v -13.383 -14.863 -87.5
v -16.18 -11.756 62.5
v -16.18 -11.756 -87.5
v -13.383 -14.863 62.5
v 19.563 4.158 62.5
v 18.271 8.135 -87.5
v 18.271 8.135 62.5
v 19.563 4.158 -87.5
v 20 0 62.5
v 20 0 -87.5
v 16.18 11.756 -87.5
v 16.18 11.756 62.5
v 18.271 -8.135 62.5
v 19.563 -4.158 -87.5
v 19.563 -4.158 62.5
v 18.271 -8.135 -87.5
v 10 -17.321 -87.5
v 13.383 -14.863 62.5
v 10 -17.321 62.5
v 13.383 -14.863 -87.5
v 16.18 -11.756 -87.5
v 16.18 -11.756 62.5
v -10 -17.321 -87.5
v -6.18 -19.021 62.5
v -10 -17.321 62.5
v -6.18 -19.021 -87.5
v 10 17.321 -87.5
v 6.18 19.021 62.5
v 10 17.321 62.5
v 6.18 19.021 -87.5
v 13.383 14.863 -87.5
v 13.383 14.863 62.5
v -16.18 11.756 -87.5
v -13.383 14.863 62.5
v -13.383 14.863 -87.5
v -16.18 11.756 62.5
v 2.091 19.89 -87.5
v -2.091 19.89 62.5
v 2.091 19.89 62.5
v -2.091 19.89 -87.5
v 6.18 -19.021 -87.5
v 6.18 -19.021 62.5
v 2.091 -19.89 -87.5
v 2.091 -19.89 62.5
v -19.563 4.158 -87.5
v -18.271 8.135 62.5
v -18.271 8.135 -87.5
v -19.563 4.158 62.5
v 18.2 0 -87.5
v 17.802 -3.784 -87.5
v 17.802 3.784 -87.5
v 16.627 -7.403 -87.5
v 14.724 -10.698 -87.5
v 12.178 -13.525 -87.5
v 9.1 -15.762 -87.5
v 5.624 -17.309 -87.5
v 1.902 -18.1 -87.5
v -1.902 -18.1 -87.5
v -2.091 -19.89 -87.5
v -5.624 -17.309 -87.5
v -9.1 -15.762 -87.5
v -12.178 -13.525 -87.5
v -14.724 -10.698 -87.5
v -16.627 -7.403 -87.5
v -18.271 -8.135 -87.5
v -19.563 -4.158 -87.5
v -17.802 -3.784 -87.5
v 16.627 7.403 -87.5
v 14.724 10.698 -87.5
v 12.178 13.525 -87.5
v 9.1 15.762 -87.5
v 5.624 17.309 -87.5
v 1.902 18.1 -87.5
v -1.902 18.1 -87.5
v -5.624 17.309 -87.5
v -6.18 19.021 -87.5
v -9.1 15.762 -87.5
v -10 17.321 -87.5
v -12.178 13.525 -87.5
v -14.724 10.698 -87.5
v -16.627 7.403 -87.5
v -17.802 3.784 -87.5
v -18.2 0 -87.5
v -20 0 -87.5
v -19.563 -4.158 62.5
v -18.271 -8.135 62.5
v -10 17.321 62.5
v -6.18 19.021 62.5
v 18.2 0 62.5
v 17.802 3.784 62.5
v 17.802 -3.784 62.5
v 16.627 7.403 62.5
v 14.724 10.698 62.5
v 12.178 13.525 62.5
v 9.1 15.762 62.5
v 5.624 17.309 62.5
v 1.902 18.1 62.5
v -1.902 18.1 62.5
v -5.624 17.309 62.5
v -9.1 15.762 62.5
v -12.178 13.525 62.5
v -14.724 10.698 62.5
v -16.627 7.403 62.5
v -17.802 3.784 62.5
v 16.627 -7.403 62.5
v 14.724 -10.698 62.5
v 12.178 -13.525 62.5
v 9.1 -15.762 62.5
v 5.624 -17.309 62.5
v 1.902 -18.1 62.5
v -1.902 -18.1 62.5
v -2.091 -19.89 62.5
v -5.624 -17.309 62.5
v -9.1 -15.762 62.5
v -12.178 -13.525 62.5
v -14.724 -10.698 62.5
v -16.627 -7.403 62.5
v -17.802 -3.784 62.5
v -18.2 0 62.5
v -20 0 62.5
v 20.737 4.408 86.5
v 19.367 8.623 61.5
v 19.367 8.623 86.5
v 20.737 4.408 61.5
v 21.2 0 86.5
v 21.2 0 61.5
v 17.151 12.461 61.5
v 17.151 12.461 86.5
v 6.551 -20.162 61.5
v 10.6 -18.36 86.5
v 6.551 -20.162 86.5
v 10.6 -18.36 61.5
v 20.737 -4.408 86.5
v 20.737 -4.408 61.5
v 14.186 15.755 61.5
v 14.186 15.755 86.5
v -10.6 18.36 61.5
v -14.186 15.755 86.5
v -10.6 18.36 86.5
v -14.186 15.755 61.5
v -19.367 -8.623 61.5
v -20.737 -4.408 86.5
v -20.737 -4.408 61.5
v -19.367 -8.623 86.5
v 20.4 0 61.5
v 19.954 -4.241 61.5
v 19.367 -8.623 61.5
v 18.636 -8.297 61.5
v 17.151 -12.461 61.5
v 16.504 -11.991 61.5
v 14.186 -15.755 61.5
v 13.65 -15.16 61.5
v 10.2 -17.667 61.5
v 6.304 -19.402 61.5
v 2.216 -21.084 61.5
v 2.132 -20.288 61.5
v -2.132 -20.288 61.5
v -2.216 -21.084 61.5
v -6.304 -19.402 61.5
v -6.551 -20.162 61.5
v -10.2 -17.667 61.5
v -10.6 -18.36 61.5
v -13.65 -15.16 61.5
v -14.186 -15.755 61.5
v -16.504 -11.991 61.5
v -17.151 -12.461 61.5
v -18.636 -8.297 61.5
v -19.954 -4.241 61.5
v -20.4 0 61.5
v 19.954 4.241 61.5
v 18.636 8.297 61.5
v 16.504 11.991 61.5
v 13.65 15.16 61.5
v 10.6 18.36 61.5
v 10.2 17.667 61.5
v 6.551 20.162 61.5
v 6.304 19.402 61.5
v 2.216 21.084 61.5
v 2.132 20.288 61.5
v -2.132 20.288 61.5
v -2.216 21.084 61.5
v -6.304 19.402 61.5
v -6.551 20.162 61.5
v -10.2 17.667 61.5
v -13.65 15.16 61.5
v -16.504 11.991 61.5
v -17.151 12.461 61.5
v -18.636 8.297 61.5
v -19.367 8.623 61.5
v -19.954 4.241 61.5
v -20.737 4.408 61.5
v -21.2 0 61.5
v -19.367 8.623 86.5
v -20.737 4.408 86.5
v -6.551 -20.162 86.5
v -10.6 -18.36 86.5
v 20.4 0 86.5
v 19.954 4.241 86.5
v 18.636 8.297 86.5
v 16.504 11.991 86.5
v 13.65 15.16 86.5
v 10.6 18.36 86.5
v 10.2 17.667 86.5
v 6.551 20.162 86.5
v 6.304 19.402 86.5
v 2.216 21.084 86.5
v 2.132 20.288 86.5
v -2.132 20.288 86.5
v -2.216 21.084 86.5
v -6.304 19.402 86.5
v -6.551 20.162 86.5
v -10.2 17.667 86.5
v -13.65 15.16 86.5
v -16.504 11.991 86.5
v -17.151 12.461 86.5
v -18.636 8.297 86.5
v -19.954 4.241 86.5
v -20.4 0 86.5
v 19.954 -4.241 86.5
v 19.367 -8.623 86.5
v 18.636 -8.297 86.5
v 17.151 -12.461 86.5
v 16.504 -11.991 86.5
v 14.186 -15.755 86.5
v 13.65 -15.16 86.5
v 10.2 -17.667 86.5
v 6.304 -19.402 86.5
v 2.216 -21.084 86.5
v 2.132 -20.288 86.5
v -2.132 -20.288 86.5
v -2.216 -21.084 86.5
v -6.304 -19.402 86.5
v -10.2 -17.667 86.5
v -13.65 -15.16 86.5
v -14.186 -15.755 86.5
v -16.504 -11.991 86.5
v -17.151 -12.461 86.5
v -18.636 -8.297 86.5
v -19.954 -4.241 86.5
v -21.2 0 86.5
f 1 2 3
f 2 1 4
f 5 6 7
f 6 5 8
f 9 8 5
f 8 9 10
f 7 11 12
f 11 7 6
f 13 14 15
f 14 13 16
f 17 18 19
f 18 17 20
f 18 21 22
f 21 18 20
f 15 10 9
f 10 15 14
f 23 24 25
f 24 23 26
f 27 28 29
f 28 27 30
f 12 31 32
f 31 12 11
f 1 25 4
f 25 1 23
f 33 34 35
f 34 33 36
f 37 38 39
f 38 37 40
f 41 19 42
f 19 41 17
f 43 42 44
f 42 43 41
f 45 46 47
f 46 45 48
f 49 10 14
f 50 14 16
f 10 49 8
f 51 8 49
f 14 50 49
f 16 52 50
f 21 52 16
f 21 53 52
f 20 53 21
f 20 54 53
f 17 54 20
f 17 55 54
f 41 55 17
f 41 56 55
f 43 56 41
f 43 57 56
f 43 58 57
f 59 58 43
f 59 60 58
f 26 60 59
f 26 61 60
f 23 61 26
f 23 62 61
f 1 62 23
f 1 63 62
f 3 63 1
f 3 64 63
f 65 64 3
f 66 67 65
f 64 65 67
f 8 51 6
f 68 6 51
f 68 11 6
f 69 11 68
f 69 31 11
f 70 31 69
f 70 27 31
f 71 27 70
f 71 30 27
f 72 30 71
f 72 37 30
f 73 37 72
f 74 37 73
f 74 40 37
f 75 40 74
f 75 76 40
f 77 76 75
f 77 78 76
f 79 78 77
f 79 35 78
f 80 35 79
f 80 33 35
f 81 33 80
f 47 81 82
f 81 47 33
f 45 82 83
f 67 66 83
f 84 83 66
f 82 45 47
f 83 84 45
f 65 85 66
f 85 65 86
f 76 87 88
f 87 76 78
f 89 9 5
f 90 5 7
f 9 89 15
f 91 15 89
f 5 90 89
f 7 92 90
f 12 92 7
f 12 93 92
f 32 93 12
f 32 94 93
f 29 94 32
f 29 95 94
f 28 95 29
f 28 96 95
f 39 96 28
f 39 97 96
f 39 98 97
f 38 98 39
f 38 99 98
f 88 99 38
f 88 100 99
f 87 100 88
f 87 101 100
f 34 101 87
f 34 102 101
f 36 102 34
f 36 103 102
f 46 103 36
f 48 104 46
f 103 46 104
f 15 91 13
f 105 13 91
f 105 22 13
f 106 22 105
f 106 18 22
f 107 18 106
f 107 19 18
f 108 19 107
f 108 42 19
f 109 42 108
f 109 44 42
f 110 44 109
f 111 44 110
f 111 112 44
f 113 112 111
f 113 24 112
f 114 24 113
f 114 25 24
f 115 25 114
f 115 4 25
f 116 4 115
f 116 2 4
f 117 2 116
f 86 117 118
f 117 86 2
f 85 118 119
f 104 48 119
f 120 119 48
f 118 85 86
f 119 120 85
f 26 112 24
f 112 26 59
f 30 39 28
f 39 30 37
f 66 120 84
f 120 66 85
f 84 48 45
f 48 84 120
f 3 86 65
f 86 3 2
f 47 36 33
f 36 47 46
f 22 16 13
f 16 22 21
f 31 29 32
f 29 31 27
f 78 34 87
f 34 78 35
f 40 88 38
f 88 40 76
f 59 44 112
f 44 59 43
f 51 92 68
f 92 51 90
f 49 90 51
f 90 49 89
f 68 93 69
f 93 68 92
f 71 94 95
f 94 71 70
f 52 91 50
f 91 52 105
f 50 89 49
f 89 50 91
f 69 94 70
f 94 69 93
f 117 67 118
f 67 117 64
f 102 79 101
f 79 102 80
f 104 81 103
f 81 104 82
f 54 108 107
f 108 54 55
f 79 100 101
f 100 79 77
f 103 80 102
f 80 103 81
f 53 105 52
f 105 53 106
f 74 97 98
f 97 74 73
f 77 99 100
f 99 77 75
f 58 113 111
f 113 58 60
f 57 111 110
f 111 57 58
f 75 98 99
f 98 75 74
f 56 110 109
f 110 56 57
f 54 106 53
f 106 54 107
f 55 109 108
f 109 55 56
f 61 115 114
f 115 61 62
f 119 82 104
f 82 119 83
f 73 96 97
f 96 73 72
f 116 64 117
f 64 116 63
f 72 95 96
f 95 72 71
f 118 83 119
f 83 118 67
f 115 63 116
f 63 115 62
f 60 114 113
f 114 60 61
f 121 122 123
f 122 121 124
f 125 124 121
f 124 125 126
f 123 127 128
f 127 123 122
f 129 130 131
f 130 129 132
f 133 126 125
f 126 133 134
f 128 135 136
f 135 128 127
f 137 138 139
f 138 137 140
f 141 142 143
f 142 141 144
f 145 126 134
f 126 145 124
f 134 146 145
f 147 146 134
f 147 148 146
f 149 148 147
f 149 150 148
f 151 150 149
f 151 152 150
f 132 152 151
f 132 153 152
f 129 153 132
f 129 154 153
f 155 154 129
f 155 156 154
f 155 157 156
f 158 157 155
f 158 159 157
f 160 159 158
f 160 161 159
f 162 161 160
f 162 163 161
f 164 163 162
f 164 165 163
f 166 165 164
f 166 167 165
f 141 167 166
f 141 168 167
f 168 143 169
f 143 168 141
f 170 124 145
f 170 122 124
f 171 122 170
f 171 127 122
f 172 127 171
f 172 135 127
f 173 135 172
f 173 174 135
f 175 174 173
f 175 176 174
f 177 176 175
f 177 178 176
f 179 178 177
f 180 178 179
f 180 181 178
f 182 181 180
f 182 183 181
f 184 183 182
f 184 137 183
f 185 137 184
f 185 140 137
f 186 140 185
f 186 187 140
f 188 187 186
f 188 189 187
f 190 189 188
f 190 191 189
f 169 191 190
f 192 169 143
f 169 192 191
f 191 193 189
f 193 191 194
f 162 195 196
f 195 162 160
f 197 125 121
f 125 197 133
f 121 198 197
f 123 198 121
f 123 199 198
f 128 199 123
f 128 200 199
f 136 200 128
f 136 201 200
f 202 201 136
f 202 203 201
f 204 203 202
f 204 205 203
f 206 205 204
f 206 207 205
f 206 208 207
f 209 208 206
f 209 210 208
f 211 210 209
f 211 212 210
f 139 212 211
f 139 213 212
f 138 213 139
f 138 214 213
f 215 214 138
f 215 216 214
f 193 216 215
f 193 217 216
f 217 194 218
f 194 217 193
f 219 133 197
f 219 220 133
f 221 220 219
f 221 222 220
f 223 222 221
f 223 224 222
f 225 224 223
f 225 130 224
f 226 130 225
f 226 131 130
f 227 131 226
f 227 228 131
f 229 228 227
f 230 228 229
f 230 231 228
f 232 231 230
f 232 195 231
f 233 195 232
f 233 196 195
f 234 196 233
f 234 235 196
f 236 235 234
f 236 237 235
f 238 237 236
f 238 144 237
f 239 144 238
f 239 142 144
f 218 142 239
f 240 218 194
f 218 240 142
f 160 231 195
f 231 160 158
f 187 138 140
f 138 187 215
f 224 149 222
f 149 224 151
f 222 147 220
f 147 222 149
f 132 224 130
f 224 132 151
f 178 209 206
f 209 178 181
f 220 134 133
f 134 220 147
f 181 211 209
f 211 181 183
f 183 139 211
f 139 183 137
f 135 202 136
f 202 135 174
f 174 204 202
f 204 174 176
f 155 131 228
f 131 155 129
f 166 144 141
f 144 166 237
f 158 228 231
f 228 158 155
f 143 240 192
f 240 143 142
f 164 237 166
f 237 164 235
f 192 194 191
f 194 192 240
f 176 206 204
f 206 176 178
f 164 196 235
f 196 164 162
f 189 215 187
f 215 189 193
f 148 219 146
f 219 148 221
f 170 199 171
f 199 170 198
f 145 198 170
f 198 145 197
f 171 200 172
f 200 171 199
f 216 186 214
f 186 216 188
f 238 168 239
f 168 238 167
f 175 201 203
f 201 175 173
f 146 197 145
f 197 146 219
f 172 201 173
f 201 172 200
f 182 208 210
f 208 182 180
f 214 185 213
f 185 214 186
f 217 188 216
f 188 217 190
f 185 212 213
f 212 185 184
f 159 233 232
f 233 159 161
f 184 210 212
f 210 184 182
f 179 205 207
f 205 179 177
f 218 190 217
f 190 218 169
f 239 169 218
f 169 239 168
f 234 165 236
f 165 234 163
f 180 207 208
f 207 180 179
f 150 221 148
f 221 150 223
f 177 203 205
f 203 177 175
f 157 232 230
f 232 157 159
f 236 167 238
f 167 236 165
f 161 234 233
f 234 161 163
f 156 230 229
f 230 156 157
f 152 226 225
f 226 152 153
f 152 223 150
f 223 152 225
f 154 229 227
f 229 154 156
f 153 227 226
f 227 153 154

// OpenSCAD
// Parameters
nominal_type = 40; //[20:80:1]
length_mm = 150; //[75:300:1]
include_fitting_end = 1; //[0:1:1]
center = 0; //[0:1:1]
ht40_outer_diameter = 40; //[30:60:0.1]
ht40_wall_thickness = 1.8; //[0.9:3.6:0.1]
fitting_socket_length = 25; //[12.5:50:0.5]
fitting_socket_wall_extra = 1.2; //[0.6:2.4:0.1]
fitting_socket_clearance = 0.4; //[0.2:1.0:0.05]
overlap_mm = 1; //[0.5:2:0.1]

// Module for HT Pipe
module ht_pipe() {
  color([0.85, 0.85, 0.8]) { // Off-white for PVC
    // Main pipe segment
    difference() {
      cylinder(r=ht40_outer_diameter/2, h=length_mm, center=false);
      translate([0, 0, -overlap_mm])
        cylinder(r=ht40_outer_diameter/2 - ht40_wall_thickness, h=length_mm + 2*overlap_mm, center=false);
    }
    
    // Optional fitting socket
    if (include_fitting_end) {
      difference() {
        translate([0, 0, length_mm - overlap_mm])
          cylinder(r=ht40_outer_diameter/2 + fitting_socket_wall_extra, h=fitting_socket_length, center=false);
        translate([0, 0, length_mm - 2*overlap_mm])
          cylinder(r=ht40_outer_diameter/2 + fitting_socket_clearance, h=fitting_socket_length + 2*overlap_mm, center=false);
      }
    }
  }
}

// Assembly
module assembly() {
  translate([0, 0, (0.5 - center) * (-(length_mm + include_fitting_end*fitting_socket_length))])
    ht_pipe();
}

assembly();
